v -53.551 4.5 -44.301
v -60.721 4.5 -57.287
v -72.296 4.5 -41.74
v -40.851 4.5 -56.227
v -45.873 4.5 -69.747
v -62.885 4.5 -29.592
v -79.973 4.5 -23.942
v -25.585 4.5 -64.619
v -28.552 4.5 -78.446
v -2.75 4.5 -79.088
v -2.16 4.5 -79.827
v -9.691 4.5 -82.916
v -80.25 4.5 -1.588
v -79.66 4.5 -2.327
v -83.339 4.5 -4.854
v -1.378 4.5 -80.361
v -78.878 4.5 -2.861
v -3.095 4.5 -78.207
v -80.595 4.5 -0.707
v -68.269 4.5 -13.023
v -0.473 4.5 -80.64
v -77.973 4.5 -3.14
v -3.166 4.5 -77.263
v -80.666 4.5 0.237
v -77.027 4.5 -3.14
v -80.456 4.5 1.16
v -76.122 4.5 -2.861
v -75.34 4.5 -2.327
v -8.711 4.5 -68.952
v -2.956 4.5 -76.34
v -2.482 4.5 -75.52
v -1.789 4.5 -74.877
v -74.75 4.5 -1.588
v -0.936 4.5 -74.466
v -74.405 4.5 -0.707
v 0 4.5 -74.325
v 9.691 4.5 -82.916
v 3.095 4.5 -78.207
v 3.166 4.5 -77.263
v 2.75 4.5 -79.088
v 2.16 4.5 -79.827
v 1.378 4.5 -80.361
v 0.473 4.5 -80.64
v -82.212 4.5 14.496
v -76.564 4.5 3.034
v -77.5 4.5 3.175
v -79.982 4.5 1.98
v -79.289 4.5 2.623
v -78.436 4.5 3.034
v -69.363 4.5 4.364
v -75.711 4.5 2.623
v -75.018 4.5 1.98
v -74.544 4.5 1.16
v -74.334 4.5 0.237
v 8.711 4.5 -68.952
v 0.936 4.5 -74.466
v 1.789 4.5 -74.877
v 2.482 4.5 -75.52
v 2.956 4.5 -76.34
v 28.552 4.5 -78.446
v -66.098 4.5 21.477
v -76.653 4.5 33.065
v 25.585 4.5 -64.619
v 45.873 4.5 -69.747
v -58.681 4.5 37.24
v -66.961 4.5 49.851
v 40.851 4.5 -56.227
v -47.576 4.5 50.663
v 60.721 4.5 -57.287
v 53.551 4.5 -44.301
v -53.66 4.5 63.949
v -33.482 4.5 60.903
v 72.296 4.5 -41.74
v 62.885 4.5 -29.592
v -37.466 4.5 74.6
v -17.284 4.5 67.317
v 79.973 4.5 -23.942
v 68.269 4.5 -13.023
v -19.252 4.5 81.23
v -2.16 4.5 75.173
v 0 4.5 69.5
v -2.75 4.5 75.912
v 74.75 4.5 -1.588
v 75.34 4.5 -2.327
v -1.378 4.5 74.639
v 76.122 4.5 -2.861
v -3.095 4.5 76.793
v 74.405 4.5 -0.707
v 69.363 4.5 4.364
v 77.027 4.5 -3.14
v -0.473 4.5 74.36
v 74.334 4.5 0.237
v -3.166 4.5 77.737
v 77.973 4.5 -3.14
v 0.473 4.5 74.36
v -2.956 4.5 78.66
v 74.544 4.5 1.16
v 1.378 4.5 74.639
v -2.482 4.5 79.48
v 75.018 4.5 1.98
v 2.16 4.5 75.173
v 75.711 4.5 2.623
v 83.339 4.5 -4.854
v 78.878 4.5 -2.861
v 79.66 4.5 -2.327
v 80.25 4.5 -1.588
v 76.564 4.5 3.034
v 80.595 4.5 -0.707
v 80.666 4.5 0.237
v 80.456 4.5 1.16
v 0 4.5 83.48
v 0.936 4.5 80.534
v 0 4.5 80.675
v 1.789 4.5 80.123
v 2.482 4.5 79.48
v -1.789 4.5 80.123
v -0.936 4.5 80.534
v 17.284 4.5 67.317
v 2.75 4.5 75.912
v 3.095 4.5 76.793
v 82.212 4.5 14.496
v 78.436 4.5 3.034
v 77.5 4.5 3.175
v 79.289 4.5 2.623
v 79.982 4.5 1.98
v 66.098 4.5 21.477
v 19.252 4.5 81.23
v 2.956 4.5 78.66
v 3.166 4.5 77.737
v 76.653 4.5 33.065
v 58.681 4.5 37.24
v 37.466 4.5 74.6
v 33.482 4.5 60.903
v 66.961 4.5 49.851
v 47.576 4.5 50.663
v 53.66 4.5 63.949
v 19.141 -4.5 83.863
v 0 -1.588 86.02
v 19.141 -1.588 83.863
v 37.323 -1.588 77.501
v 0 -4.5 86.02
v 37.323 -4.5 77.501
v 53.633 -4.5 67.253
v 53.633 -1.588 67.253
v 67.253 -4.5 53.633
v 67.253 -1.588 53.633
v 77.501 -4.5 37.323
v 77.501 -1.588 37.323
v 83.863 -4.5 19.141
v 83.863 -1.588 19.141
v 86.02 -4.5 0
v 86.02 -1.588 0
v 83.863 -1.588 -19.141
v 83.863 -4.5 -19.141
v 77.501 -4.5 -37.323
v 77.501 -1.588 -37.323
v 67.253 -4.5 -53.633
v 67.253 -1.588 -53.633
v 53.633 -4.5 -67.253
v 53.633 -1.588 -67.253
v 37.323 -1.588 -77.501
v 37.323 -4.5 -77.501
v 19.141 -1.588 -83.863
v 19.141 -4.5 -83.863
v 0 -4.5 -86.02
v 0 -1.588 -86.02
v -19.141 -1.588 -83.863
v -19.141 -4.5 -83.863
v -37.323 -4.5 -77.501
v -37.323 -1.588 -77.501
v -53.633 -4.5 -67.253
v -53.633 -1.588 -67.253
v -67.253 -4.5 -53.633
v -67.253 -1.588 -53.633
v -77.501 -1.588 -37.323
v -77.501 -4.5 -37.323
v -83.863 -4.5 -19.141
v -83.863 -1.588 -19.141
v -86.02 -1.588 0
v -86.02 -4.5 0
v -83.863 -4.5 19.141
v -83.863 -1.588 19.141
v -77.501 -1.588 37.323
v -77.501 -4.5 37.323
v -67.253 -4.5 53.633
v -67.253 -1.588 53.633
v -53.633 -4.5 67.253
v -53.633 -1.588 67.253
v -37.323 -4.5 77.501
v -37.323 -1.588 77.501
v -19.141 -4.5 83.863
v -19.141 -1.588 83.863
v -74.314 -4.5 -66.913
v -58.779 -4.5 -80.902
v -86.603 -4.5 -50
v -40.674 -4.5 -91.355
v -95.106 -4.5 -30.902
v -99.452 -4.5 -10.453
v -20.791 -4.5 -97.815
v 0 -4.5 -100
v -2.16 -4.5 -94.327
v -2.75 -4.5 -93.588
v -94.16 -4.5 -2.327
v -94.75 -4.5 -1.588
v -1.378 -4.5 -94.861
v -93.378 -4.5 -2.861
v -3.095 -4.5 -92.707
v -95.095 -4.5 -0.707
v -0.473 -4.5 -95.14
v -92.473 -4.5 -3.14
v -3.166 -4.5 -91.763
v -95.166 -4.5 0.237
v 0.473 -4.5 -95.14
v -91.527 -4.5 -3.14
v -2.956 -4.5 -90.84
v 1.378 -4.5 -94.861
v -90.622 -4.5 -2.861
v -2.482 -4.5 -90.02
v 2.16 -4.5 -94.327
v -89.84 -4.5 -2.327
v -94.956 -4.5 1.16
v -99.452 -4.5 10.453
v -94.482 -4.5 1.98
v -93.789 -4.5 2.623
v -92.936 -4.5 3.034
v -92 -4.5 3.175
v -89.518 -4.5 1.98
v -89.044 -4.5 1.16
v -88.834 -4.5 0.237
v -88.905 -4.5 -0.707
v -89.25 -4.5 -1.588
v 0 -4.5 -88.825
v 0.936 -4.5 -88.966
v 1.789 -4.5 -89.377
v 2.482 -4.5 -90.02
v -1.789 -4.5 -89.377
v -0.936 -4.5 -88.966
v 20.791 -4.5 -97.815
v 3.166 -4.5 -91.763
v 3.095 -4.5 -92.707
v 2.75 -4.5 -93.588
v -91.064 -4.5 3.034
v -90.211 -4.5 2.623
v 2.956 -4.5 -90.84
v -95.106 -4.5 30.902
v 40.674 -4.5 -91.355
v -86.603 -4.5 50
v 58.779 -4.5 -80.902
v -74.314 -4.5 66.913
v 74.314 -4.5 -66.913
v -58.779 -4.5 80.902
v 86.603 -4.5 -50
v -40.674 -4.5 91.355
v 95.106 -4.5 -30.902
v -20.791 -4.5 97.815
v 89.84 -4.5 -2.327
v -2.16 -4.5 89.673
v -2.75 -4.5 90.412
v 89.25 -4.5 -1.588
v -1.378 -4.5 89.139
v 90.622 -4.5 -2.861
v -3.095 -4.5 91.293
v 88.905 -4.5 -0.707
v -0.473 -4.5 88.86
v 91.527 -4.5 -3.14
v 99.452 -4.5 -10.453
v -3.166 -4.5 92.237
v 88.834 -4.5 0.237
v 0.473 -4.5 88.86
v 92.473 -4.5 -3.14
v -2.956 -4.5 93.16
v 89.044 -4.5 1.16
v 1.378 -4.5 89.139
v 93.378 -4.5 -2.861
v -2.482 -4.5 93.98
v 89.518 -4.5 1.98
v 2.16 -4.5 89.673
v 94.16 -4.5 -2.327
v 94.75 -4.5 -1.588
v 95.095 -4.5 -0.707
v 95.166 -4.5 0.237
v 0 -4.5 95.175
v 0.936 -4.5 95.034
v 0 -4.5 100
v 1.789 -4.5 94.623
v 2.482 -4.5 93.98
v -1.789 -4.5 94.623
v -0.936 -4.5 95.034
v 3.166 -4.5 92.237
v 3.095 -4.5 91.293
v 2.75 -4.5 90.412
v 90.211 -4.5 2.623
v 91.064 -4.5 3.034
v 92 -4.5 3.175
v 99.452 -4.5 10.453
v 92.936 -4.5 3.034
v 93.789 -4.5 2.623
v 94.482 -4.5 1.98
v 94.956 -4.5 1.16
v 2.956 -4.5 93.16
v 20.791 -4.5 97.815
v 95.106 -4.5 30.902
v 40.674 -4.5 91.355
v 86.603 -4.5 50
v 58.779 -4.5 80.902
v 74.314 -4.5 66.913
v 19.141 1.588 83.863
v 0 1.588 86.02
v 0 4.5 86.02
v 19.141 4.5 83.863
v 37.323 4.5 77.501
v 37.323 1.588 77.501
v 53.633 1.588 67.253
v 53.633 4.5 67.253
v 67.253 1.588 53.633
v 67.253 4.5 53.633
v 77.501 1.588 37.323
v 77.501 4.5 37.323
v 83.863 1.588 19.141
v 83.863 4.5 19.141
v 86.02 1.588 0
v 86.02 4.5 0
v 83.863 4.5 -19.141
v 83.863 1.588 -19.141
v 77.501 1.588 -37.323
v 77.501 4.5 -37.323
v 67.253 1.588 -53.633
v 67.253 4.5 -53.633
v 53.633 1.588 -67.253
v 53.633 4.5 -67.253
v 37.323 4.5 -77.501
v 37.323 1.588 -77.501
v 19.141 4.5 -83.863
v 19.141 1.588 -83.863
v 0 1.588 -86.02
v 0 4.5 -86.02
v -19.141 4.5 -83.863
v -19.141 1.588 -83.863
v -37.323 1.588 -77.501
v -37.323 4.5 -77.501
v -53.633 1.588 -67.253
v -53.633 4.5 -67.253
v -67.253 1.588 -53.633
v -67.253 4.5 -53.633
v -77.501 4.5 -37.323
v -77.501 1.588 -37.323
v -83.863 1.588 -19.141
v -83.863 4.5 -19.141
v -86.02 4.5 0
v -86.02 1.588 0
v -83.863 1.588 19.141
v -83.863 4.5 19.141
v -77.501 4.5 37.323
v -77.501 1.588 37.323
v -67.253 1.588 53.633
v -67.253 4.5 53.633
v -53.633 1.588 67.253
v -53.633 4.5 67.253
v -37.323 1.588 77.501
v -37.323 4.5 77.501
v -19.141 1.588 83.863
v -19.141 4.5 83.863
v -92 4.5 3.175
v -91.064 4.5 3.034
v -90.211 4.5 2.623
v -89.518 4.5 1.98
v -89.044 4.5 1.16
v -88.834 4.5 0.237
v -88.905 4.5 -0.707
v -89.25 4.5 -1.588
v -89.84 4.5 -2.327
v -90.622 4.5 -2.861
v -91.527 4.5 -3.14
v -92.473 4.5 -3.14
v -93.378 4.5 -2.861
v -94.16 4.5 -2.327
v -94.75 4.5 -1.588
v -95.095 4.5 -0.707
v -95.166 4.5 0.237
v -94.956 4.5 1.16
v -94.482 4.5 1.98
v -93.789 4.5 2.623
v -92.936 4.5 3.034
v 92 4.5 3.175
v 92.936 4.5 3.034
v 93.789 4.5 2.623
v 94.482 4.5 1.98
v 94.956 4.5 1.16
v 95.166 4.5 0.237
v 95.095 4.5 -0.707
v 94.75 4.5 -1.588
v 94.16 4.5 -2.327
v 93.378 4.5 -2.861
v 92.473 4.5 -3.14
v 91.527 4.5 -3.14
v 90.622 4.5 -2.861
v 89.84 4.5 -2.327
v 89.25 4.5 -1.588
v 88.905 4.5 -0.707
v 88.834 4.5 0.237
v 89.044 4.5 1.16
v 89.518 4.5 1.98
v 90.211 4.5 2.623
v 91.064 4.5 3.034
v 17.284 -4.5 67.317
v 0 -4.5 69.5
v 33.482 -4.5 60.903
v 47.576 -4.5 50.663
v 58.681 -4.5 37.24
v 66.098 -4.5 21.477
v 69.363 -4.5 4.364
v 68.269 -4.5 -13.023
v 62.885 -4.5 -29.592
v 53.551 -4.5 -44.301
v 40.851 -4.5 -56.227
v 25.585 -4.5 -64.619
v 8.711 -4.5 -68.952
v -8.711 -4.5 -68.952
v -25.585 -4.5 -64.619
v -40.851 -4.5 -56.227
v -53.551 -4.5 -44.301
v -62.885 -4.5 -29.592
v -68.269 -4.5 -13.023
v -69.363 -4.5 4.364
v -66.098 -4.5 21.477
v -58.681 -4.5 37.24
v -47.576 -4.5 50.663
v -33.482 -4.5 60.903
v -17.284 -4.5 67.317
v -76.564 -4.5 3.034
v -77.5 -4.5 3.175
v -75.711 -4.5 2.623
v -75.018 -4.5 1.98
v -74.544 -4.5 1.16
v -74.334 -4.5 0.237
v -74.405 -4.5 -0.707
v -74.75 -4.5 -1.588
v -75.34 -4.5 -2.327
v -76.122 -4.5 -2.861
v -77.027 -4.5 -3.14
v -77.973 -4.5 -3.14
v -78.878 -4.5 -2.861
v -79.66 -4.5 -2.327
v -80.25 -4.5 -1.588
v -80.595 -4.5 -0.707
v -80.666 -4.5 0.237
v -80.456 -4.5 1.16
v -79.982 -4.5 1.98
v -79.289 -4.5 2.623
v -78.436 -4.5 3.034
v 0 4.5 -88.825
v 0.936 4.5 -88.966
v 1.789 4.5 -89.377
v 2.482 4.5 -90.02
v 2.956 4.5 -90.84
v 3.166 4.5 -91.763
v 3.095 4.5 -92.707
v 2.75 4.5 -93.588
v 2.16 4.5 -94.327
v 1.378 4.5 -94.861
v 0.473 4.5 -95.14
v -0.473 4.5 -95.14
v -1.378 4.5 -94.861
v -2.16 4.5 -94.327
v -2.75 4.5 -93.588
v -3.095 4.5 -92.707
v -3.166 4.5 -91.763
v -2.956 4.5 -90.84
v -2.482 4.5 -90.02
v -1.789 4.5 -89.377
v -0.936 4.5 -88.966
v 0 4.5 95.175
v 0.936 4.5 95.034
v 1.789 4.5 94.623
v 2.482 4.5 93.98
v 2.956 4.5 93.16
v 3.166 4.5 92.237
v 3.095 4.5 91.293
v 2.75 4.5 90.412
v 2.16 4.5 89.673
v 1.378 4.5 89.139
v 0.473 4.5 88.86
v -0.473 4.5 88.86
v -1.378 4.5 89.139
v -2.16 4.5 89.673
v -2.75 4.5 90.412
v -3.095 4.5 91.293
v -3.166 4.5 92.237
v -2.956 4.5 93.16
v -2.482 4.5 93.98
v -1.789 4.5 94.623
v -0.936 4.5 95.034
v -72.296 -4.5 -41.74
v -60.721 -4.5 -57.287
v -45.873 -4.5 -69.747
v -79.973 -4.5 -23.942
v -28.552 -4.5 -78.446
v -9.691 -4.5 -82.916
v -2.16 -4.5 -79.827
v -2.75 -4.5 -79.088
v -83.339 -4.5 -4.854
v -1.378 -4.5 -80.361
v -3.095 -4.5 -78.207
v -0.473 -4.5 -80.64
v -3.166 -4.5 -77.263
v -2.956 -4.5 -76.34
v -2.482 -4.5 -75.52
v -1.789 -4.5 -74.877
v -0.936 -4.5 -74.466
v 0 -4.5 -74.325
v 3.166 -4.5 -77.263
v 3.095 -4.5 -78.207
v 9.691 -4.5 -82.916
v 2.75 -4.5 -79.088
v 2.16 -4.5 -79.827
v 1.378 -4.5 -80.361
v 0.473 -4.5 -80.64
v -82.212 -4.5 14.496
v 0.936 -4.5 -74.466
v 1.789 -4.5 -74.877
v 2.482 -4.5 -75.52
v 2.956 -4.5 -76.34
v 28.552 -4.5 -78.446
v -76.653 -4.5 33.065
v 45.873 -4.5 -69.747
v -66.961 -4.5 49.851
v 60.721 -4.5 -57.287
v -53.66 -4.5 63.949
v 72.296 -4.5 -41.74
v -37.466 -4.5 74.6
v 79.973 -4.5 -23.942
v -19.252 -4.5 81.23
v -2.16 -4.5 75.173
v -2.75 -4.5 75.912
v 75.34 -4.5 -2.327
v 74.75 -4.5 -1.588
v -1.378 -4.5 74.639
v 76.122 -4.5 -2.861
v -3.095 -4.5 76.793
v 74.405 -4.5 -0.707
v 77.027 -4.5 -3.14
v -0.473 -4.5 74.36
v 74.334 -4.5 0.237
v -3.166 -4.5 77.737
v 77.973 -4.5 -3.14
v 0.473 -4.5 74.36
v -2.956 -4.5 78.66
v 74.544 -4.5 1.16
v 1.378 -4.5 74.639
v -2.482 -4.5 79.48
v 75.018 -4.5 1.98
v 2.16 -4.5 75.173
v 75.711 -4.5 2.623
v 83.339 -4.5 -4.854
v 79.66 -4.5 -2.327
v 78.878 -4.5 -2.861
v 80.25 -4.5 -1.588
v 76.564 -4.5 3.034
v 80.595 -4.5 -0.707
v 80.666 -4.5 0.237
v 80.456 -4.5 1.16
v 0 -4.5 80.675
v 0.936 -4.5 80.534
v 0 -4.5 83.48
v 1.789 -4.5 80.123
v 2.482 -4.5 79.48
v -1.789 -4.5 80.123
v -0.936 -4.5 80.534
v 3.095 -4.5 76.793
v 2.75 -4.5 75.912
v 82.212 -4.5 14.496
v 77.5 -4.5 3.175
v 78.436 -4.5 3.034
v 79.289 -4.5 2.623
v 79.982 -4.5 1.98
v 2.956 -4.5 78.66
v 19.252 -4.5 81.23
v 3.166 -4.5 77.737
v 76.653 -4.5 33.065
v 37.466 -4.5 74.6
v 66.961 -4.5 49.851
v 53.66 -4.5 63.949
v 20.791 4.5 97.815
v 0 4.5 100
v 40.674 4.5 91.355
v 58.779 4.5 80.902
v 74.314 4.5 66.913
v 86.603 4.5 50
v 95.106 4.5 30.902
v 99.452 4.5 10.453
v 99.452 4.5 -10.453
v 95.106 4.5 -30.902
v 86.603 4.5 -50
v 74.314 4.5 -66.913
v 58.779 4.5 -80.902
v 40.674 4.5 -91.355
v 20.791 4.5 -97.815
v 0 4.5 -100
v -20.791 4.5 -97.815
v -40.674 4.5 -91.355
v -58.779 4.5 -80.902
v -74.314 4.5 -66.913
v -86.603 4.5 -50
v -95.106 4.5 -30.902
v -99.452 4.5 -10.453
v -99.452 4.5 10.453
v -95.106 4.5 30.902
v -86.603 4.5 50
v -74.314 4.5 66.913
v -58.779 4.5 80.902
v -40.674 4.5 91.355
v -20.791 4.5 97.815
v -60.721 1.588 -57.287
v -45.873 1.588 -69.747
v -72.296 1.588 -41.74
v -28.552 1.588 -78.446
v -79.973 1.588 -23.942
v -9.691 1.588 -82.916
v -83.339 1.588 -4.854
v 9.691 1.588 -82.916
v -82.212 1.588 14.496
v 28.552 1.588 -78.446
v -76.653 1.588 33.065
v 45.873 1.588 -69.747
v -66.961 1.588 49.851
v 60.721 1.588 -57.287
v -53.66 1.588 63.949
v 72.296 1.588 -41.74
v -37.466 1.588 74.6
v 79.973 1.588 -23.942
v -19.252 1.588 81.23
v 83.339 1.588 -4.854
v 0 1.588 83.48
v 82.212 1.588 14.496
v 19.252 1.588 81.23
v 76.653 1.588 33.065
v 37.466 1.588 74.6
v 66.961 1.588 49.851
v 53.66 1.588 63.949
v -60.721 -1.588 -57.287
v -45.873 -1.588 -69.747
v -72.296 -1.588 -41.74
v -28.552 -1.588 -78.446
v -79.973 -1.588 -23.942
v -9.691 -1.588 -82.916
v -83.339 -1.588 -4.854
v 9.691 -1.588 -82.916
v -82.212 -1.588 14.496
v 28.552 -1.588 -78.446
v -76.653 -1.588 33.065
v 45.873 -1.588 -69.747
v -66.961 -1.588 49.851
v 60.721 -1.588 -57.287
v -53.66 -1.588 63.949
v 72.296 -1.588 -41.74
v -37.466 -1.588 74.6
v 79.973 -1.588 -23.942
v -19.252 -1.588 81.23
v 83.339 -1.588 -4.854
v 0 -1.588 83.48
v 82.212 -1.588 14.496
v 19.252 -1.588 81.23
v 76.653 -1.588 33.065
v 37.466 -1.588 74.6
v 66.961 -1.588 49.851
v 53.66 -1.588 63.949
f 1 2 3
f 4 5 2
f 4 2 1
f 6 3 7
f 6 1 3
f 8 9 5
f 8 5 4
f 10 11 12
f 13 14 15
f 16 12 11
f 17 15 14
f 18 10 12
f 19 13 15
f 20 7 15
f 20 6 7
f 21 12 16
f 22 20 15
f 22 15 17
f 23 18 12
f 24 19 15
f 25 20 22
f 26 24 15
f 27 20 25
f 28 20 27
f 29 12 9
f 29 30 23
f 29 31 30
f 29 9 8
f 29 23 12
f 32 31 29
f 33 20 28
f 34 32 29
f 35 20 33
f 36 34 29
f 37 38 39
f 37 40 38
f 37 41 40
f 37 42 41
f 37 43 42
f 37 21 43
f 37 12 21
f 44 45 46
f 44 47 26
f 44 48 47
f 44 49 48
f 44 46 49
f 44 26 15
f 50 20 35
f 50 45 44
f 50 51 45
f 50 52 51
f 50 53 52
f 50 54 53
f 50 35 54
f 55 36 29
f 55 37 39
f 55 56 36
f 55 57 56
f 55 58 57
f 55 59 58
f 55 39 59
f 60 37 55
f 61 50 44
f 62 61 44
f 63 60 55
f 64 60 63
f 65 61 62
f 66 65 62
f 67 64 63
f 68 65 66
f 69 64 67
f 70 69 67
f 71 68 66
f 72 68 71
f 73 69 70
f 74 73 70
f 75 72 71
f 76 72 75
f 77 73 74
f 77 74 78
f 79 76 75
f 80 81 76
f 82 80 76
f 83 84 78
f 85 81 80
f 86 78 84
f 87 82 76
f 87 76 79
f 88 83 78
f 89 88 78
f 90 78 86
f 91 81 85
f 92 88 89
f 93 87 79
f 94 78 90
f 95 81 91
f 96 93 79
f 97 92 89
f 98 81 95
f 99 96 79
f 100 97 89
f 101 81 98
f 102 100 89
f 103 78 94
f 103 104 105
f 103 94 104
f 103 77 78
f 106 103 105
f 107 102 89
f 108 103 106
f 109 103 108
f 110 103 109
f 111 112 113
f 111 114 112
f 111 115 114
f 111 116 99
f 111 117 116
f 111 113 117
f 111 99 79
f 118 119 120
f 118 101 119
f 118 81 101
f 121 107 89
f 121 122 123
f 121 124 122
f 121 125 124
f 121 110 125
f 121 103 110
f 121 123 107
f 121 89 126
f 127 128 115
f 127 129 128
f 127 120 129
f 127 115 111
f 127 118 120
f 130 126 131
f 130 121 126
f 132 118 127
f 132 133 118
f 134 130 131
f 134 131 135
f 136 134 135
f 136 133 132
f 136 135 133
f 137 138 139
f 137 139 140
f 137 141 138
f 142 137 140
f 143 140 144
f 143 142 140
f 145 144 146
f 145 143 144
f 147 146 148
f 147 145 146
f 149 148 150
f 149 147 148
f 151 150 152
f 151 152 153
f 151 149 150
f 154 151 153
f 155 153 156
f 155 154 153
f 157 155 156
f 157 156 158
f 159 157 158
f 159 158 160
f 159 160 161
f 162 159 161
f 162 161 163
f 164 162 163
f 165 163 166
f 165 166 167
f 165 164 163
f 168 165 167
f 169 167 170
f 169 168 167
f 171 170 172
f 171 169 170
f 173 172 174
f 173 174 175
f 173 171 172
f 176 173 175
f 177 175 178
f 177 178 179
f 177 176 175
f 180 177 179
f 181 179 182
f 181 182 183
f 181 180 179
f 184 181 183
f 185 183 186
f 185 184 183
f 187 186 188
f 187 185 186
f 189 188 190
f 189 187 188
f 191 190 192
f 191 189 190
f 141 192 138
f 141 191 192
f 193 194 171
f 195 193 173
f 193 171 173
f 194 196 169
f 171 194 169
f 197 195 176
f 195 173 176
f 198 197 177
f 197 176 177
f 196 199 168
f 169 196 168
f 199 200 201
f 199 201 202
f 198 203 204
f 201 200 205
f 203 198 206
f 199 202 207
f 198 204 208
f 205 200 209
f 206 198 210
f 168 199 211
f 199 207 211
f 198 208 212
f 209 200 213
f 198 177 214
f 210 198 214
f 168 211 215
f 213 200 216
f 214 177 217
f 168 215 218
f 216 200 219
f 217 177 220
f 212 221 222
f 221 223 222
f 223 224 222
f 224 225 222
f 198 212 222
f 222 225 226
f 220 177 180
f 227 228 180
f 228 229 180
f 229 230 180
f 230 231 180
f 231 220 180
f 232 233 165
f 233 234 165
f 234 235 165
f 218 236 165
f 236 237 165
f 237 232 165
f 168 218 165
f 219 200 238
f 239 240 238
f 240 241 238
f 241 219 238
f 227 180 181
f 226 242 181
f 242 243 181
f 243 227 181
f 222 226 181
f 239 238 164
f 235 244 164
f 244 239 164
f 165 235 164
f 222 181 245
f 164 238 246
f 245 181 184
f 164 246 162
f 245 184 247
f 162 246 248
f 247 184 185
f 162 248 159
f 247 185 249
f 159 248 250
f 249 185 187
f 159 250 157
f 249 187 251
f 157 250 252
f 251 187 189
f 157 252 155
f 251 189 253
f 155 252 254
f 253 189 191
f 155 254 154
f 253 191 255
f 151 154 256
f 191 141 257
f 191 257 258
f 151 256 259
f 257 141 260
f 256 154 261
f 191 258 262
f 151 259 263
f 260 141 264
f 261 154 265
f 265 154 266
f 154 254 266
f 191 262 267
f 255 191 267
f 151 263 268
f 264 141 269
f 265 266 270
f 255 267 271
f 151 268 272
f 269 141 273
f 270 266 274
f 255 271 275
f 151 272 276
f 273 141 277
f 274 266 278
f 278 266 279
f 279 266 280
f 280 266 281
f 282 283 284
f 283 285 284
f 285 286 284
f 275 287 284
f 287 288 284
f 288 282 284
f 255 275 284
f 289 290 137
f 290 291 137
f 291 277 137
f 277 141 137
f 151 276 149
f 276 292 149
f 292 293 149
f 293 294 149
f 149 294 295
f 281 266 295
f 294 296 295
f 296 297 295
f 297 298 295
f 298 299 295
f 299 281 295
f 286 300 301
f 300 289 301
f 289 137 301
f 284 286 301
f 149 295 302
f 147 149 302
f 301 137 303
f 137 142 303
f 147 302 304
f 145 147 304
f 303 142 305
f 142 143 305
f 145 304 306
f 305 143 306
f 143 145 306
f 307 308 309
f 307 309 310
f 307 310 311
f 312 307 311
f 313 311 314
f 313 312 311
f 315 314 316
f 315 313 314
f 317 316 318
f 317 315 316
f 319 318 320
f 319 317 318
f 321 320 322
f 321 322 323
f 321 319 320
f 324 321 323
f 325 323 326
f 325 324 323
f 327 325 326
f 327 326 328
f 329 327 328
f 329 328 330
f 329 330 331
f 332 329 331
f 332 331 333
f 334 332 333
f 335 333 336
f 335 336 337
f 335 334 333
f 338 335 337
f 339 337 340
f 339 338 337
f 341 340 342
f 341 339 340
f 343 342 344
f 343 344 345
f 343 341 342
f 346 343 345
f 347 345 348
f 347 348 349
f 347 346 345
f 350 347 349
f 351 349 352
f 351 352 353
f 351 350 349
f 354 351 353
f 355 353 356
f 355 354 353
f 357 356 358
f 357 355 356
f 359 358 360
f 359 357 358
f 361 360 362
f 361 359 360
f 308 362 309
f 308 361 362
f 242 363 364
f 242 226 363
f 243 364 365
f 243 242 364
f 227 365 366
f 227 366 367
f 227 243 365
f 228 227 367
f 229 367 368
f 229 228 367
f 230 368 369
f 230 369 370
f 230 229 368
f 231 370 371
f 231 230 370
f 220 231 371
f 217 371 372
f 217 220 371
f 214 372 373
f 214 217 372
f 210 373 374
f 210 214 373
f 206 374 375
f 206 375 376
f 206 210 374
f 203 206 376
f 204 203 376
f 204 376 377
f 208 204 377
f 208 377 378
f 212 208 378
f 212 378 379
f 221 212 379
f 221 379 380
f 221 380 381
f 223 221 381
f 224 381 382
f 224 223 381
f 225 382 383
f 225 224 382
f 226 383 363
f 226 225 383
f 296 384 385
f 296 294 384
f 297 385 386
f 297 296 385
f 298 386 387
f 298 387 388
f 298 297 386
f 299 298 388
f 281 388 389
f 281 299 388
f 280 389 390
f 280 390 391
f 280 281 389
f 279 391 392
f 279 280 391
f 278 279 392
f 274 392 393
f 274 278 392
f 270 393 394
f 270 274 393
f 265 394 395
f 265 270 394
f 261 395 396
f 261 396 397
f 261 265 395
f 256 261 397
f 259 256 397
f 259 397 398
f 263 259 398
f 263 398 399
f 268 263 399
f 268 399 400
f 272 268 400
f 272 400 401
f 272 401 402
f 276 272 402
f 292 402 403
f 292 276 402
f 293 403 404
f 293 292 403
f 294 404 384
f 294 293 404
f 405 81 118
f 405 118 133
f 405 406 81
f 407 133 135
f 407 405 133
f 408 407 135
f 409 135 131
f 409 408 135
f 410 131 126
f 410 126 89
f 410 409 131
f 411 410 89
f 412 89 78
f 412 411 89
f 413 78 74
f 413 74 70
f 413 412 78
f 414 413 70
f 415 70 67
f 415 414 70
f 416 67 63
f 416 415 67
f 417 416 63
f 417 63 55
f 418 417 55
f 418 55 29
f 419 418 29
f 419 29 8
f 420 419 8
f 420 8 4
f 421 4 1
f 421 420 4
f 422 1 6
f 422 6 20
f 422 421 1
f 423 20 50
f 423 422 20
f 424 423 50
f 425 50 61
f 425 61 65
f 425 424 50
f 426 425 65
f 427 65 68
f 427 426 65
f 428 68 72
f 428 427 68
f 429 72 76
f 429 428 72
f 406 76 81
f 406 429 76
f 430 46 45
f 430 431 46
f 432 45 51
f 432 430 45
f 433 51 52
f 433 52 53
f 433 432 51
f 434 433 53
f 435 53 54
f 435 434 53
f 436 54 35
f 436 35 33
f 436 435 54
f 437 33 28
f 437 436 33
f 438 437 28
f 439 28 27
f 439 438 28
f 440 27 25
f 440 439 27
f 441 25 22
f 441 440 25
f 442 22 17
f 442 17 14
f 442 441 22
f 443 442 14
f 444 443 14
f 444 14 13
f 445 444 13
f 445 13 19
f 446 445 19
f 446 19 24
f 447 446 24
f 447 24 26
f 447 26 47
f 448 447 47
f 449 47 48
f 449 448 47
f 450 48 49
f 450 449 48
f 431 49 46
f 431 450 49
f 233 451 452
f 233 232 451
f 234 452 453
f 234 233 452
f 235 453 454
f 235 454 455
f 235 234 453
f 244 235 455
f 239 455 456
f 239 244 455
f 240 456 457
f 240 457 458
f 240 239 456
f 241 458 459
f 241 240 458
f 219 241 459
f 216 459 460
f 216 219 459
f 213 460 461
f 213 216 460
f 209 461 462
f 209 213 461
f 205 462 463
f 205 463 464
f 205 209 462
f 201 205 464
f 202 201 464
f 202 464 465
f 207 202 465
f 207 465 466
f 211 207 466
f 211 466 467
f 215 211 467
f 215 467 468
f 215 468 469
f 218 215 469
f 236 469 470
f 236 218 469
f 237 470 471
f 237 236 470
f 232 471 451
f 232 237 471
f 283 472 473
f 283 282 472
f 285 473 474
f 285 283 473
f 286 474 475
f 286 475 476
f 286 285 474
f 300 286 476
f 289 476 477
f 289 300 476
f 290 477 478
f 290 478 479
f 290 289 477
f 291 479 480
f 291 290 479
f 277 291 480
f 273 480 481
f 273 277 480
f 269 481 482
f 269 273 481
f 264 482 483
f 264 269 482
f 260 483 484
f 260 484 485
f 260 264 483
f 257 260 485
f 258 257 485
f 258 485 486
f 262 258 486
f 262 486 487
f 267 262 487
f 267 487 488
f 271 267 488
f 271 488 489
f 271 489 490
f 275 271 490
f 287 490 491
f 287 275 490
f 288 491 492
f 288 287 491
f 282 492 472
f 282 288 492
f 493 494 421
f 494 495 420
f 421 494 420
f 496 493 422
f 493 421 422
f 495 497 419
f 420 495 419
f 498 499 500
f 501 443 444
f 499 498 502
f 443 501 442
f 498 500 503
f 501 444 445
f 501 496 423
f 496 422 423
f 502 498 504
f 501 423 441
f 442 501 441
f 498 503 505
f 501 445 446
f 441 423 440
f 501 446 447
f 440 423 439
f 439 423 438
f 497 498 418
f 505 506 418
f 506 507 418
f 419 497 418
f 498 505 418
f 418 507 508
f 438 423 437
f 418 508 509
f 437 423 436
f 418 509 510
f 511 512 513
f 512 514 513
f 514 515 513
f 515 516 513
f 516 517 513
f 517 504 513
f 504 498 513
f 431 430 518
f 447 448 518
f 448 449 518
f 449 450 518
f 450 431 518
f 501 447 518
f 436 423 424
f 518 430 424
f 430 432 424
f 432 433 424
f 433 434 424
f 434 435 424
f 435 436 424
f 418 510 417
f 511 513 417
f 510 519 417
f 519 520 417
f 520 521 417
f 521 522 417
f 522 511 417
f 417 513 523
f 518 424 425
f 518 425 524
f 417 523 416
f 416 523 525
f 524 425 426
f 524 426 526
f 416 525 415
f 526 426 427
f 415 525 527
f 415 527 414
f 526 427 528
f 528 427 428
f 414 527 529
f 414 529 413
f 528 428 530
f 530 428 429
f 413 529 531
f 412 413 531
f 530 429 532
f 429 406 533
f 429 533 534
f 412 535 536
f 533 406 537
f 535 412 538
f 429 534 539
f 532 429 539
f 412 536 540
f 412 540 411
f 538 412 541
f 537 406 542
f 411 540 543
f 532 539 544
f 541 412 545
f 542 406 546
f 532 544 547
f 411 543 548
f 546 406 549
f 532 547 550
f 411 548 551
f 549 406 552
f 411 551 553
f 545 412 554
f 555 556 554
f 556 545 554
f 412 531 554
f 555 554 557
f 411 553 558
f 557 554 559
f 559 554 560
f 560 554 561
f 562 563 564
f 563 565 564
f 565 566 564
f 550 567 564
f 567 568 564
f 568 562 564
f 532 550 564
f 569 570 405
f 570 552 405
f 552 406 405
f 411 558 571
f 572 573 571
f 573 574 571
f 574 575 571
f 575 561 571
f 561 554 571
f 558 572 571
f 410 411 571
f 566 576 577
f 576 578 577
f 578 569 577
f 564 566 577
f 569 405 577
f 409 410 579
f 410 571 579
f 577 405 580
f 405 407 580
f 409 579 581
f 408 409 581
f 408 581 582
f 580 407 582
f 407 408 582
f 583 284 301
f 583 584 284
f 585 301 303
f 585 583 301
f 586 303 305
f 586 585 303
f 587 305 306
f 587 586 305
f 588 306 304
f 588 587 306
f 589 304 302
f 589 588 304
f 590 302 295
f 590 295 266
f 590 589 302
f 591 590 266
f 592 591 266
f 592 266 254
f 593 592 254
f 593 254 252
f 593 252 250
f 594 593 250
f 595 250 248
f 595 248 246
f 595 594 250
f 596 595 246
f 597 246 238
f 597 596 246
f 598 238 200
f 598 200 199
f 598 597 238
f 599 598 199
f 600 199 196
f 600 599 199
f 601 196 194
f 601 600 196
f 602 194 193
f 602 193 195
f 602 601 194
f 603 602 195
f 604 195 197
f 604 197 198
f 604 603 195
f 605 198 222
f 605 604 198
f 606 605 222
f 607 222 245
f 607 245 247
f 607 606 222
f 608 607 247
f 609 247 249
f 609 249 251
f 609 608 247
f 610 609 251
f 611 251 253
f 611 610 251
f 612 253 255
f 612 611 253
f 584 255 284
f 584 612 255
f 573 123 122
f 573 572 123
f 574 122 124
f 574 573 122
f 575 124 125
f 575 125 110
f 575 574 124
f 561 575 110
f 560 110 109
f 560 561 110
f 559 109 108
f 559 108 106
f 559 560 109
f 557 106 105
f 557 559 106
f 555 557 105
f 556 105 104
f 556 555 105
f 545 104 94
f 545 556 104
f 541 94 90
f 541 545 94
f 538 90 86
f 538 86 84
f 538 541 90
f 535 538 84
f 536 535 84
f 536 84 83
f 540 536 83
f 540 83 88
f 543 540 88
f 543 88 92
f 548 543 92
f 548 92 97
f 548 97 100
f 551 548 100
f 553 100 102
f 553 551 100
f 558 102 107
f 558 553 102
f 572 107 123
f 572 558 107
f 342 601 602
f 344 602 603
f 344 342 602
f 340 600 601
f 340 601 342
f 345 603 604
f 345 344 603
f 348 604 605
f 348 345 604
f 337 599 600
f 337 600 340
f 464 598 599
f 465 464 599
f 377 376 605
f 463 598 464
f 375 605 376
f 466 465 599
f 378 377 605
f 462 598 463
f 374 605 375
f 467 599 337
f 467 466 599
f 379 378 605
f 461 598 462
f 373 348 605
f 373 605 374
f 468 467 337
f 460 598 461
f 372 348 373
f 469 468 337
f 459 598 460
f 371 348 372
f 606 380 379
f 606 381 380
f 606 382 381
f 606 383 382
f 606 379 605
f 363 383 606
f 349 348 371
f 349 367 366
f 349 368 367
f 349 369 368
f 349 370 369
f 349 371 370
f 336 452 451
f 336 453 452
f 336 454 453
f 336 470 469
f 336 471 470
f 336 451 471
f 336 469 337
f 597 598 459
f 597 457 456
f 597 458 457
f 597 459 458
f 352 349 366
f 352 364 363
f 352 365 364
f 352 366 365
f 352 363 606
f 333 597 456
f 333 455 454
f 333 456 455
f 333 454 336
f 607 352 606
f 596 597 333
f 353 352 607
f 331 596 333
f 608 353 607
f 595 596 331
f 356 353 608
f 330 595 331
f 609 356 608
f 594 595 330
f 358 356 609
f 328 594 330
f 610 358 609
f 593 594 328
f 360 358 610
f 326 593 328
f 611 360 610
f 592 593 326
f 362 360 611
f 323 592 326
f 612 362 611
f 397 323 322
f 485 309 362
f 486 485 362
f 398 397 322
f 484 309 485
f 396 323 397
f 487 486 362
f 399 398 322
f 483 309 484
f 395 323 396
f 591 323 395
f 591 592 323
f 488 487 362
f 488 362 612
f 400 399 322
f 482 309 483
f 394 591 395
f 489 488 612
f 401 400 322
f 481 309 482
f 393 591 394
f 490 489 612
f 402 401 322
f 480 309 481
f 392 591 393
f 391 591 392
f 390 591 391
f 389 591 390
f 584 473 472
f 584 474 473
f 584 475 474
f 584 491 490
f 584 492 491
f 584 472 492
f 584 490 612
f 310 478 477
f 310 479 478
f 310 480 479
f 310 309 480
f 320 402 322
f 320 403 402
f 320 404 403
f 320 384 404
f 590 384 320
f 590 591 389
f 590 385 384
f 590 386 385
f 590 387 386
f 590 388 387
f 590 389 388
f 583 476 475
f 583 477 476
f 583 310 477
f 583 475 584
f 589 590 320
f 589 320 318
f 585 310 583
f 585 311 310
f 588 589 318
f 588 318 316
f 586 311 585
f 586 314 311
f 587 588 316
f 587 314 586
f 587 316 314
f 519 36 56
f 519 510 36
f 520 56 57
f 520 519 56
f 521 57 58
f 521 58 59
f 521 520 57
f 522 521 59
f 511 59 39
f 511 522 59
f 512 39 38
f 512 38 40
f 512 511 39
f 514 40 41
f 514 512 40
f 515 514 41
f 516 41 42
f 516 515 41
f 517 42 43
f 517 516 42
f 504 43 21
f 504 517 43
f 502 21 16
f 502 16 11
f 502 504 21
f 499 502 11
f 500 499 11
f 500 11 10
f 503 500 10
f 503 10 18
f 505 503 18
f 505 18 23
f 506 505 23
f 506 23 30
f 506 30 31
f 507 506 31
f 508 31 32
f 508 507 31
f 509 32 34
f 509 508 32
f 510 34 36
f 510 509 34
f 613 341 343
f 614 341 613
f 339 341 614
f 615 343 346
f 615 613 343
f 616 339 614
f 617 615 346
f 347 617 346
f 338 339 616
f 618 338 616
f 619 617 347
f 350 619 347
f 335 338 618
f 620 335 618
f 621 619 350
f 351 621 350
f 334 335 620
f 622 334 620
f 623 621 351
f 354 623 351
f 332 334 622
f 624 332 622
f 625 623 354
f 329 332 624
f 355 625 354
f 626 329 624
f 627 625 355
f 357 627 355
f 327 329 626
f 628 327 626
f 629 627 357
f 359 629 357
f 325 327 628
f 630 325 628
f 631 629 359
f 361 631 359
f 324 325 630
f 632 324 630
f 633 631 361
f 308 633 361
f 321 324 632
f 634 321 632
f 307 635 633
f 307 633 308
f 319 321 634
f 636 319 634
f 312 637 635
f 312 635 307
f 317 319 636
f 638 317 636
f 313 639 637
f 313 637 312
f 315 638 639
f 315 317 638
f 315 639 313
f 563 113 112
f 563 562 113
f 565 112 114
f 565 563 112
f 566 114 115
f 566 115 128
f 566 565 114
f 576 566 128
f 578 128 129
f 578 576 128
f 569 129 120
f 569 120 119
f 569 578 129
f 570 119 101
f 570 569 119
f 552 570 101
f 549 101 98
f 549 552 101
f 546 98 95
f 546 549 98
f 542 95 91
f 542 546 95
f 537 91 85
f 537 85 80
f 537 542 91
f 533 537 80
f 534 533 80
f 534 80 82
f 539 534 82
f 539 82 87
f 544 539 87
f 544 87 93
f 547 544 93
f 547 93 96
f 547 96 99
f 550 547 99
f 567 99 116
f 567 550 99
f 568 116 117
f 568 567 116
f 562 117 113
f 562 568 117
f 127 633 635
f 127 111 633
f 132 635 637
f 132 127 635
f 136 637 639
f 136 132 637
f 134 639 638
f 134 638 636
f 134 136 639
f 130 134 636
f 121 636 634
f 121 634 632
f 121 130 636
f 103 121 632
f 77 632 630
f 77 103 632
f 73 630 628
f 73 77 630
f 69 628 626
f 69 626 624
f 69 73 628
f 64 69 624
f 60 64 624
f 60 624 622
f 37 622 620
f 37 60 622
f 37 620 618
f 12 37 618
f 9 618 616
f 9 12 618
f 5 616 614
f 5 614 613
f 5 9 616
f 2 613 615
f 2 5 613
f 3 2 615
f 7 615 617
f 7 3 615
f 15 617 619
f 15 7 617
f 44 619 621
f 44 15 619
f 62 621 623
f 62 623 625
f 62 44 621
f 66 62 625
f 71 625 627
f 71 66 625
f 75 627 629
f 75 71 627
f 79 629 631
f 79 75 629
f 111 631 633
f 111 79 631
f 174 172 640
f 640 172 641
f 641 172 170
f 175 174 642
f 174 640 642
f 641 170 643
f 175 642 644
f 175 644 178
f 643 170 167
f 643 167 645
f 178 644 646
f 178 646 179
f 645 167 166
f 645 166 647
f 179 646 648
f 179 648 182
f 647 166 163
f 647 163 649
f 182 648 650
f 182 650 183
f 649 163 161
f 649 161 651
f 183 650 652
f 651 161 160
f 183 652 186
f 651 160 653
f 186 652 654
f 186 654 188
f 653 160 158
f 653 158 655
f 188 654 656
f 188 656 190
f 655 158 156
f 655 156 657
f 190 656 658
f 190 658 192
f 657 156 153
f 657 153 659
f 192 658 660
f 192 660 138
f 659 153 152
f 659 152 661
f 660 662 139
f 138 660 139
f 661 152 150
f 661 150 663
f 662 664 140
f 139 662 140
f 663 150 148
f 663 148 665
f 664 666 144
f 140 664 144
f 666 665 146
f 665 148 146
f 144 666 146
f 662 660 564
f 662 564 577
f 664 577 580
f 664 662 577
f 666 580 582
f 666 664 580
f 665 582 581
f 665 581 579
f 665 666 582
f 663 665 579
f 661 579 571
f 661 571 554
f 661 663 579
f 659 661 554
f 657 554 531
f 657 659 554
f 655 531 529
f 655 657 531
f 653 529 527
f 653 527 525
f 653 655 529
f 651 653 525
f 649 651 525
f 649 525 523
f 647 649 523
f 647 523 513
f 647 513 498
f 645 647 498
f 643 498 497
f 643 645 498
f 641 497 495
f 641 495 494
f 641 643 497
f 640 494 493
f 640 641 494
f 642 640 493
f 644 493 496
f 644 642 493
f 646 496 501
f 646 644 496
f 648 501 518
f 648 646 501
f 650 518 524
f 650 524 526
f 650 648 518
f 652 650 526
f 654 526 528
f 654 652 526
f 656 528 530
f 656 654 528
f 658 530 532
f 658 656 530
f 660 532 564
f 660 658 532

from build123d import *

# Parameters (mm, degrees)
SKETCH1_R             = 100
SKETCH1_R_2           = 3.175
SKETCH1_R_3           = 86.02
BOSS_EXTRUDE1_DEPTH   = 4.5
SKETCH1_R_4           = 83.48
SKETCH1_R_5           = 69.5
BOSS_EXTRUDE1_2_DEPTH = 4.5
SKETCH1_3_R           = 86.02
SKETCH1_3_R_2         = 83.48
BOSS_EXTRUDE2_DEPTH   = 1.5875


with BuildPart() as part:
    # Sketch1 → Boss-Extrude1 (new, symmetric)
    with BuildSketch(Plane(origin=(0, 0, 0), x_dir=(1, 0, 0), z_dir=(0, 1, 0))):
        Circle(SKETCH1_R)
        with Locations((-92, 0)):
            Circle(SKETCH1_R_2, mode=Mode.SUBTRACT)
        with Locations((0, -92)):
            Circle(SKETCH1_R_2, mode=Mode.SUBTRACT)
        with Locations((0, 92)):
            Circle(SKETCH1_R_2, mode=Mode.SUBTRACT)
        Circle(SKETCH1_R_3, mode=Mode.SUBTRACT)
        with Locations((92, 0)):
            Circle(SKETCH1_R_2, mode=Mode.SUBTRACT)
    extrude(amount=BOSS_EXTRUDE1_DEPTH, both=True)



with BuildPart() as body_2:
    # Sketch1 → Boss-Extrude1 2 (new, symmetric)
    with BuildSketch(Plane(origin=(0, 0, 0), x_dir=(1, 0, 0), z_dir=(0, 1, 0))):
        Circle(SKETCH1_R_4)
        with Locations((-77.5, 0)):
            Circle(SKETCH1_R_2, mode=Mode.SUBTRACT)
        with Locations((0, -77.5)):
            Circle(SKETCH1_R_2, mode=Mode.SUBTRACT)
        with Locations((0, 77.5)):
            Circle(SKETCH1_R_2, mode=Mode.SUBTRACT)
        Circle(SKETCH1_R_5, mode=Mode.SUBTRACT)
        with Locations((77.5, 0)):
            Circle(SKETCH1_R_2, mode=Mode.SUBTRACT)
    extrude(amount=BOSS_EXTRUDE1_2_DEPTH, both=True)


with BuildPart() as part_1:
    add(part.part)

    add(body_2.part)  # Boss-Extrude2 merges body 2
    # Sketch1<3> → Boss-Extrude2 (add, symmetric)
    with BuildSketch(Plane(origin=(0, 0, 0), x_dir=(1, 0, 0), z_dir=(0, 1, 0))):
        Circle(SKETCH1_3_R)
        Circle(SKETCH1_3_R_2, mode=Mode.SUBTRACT)
    extrude(amount=BOSS_EXTRUDE2_DEPTH, both=True)


solid = part_1.part
